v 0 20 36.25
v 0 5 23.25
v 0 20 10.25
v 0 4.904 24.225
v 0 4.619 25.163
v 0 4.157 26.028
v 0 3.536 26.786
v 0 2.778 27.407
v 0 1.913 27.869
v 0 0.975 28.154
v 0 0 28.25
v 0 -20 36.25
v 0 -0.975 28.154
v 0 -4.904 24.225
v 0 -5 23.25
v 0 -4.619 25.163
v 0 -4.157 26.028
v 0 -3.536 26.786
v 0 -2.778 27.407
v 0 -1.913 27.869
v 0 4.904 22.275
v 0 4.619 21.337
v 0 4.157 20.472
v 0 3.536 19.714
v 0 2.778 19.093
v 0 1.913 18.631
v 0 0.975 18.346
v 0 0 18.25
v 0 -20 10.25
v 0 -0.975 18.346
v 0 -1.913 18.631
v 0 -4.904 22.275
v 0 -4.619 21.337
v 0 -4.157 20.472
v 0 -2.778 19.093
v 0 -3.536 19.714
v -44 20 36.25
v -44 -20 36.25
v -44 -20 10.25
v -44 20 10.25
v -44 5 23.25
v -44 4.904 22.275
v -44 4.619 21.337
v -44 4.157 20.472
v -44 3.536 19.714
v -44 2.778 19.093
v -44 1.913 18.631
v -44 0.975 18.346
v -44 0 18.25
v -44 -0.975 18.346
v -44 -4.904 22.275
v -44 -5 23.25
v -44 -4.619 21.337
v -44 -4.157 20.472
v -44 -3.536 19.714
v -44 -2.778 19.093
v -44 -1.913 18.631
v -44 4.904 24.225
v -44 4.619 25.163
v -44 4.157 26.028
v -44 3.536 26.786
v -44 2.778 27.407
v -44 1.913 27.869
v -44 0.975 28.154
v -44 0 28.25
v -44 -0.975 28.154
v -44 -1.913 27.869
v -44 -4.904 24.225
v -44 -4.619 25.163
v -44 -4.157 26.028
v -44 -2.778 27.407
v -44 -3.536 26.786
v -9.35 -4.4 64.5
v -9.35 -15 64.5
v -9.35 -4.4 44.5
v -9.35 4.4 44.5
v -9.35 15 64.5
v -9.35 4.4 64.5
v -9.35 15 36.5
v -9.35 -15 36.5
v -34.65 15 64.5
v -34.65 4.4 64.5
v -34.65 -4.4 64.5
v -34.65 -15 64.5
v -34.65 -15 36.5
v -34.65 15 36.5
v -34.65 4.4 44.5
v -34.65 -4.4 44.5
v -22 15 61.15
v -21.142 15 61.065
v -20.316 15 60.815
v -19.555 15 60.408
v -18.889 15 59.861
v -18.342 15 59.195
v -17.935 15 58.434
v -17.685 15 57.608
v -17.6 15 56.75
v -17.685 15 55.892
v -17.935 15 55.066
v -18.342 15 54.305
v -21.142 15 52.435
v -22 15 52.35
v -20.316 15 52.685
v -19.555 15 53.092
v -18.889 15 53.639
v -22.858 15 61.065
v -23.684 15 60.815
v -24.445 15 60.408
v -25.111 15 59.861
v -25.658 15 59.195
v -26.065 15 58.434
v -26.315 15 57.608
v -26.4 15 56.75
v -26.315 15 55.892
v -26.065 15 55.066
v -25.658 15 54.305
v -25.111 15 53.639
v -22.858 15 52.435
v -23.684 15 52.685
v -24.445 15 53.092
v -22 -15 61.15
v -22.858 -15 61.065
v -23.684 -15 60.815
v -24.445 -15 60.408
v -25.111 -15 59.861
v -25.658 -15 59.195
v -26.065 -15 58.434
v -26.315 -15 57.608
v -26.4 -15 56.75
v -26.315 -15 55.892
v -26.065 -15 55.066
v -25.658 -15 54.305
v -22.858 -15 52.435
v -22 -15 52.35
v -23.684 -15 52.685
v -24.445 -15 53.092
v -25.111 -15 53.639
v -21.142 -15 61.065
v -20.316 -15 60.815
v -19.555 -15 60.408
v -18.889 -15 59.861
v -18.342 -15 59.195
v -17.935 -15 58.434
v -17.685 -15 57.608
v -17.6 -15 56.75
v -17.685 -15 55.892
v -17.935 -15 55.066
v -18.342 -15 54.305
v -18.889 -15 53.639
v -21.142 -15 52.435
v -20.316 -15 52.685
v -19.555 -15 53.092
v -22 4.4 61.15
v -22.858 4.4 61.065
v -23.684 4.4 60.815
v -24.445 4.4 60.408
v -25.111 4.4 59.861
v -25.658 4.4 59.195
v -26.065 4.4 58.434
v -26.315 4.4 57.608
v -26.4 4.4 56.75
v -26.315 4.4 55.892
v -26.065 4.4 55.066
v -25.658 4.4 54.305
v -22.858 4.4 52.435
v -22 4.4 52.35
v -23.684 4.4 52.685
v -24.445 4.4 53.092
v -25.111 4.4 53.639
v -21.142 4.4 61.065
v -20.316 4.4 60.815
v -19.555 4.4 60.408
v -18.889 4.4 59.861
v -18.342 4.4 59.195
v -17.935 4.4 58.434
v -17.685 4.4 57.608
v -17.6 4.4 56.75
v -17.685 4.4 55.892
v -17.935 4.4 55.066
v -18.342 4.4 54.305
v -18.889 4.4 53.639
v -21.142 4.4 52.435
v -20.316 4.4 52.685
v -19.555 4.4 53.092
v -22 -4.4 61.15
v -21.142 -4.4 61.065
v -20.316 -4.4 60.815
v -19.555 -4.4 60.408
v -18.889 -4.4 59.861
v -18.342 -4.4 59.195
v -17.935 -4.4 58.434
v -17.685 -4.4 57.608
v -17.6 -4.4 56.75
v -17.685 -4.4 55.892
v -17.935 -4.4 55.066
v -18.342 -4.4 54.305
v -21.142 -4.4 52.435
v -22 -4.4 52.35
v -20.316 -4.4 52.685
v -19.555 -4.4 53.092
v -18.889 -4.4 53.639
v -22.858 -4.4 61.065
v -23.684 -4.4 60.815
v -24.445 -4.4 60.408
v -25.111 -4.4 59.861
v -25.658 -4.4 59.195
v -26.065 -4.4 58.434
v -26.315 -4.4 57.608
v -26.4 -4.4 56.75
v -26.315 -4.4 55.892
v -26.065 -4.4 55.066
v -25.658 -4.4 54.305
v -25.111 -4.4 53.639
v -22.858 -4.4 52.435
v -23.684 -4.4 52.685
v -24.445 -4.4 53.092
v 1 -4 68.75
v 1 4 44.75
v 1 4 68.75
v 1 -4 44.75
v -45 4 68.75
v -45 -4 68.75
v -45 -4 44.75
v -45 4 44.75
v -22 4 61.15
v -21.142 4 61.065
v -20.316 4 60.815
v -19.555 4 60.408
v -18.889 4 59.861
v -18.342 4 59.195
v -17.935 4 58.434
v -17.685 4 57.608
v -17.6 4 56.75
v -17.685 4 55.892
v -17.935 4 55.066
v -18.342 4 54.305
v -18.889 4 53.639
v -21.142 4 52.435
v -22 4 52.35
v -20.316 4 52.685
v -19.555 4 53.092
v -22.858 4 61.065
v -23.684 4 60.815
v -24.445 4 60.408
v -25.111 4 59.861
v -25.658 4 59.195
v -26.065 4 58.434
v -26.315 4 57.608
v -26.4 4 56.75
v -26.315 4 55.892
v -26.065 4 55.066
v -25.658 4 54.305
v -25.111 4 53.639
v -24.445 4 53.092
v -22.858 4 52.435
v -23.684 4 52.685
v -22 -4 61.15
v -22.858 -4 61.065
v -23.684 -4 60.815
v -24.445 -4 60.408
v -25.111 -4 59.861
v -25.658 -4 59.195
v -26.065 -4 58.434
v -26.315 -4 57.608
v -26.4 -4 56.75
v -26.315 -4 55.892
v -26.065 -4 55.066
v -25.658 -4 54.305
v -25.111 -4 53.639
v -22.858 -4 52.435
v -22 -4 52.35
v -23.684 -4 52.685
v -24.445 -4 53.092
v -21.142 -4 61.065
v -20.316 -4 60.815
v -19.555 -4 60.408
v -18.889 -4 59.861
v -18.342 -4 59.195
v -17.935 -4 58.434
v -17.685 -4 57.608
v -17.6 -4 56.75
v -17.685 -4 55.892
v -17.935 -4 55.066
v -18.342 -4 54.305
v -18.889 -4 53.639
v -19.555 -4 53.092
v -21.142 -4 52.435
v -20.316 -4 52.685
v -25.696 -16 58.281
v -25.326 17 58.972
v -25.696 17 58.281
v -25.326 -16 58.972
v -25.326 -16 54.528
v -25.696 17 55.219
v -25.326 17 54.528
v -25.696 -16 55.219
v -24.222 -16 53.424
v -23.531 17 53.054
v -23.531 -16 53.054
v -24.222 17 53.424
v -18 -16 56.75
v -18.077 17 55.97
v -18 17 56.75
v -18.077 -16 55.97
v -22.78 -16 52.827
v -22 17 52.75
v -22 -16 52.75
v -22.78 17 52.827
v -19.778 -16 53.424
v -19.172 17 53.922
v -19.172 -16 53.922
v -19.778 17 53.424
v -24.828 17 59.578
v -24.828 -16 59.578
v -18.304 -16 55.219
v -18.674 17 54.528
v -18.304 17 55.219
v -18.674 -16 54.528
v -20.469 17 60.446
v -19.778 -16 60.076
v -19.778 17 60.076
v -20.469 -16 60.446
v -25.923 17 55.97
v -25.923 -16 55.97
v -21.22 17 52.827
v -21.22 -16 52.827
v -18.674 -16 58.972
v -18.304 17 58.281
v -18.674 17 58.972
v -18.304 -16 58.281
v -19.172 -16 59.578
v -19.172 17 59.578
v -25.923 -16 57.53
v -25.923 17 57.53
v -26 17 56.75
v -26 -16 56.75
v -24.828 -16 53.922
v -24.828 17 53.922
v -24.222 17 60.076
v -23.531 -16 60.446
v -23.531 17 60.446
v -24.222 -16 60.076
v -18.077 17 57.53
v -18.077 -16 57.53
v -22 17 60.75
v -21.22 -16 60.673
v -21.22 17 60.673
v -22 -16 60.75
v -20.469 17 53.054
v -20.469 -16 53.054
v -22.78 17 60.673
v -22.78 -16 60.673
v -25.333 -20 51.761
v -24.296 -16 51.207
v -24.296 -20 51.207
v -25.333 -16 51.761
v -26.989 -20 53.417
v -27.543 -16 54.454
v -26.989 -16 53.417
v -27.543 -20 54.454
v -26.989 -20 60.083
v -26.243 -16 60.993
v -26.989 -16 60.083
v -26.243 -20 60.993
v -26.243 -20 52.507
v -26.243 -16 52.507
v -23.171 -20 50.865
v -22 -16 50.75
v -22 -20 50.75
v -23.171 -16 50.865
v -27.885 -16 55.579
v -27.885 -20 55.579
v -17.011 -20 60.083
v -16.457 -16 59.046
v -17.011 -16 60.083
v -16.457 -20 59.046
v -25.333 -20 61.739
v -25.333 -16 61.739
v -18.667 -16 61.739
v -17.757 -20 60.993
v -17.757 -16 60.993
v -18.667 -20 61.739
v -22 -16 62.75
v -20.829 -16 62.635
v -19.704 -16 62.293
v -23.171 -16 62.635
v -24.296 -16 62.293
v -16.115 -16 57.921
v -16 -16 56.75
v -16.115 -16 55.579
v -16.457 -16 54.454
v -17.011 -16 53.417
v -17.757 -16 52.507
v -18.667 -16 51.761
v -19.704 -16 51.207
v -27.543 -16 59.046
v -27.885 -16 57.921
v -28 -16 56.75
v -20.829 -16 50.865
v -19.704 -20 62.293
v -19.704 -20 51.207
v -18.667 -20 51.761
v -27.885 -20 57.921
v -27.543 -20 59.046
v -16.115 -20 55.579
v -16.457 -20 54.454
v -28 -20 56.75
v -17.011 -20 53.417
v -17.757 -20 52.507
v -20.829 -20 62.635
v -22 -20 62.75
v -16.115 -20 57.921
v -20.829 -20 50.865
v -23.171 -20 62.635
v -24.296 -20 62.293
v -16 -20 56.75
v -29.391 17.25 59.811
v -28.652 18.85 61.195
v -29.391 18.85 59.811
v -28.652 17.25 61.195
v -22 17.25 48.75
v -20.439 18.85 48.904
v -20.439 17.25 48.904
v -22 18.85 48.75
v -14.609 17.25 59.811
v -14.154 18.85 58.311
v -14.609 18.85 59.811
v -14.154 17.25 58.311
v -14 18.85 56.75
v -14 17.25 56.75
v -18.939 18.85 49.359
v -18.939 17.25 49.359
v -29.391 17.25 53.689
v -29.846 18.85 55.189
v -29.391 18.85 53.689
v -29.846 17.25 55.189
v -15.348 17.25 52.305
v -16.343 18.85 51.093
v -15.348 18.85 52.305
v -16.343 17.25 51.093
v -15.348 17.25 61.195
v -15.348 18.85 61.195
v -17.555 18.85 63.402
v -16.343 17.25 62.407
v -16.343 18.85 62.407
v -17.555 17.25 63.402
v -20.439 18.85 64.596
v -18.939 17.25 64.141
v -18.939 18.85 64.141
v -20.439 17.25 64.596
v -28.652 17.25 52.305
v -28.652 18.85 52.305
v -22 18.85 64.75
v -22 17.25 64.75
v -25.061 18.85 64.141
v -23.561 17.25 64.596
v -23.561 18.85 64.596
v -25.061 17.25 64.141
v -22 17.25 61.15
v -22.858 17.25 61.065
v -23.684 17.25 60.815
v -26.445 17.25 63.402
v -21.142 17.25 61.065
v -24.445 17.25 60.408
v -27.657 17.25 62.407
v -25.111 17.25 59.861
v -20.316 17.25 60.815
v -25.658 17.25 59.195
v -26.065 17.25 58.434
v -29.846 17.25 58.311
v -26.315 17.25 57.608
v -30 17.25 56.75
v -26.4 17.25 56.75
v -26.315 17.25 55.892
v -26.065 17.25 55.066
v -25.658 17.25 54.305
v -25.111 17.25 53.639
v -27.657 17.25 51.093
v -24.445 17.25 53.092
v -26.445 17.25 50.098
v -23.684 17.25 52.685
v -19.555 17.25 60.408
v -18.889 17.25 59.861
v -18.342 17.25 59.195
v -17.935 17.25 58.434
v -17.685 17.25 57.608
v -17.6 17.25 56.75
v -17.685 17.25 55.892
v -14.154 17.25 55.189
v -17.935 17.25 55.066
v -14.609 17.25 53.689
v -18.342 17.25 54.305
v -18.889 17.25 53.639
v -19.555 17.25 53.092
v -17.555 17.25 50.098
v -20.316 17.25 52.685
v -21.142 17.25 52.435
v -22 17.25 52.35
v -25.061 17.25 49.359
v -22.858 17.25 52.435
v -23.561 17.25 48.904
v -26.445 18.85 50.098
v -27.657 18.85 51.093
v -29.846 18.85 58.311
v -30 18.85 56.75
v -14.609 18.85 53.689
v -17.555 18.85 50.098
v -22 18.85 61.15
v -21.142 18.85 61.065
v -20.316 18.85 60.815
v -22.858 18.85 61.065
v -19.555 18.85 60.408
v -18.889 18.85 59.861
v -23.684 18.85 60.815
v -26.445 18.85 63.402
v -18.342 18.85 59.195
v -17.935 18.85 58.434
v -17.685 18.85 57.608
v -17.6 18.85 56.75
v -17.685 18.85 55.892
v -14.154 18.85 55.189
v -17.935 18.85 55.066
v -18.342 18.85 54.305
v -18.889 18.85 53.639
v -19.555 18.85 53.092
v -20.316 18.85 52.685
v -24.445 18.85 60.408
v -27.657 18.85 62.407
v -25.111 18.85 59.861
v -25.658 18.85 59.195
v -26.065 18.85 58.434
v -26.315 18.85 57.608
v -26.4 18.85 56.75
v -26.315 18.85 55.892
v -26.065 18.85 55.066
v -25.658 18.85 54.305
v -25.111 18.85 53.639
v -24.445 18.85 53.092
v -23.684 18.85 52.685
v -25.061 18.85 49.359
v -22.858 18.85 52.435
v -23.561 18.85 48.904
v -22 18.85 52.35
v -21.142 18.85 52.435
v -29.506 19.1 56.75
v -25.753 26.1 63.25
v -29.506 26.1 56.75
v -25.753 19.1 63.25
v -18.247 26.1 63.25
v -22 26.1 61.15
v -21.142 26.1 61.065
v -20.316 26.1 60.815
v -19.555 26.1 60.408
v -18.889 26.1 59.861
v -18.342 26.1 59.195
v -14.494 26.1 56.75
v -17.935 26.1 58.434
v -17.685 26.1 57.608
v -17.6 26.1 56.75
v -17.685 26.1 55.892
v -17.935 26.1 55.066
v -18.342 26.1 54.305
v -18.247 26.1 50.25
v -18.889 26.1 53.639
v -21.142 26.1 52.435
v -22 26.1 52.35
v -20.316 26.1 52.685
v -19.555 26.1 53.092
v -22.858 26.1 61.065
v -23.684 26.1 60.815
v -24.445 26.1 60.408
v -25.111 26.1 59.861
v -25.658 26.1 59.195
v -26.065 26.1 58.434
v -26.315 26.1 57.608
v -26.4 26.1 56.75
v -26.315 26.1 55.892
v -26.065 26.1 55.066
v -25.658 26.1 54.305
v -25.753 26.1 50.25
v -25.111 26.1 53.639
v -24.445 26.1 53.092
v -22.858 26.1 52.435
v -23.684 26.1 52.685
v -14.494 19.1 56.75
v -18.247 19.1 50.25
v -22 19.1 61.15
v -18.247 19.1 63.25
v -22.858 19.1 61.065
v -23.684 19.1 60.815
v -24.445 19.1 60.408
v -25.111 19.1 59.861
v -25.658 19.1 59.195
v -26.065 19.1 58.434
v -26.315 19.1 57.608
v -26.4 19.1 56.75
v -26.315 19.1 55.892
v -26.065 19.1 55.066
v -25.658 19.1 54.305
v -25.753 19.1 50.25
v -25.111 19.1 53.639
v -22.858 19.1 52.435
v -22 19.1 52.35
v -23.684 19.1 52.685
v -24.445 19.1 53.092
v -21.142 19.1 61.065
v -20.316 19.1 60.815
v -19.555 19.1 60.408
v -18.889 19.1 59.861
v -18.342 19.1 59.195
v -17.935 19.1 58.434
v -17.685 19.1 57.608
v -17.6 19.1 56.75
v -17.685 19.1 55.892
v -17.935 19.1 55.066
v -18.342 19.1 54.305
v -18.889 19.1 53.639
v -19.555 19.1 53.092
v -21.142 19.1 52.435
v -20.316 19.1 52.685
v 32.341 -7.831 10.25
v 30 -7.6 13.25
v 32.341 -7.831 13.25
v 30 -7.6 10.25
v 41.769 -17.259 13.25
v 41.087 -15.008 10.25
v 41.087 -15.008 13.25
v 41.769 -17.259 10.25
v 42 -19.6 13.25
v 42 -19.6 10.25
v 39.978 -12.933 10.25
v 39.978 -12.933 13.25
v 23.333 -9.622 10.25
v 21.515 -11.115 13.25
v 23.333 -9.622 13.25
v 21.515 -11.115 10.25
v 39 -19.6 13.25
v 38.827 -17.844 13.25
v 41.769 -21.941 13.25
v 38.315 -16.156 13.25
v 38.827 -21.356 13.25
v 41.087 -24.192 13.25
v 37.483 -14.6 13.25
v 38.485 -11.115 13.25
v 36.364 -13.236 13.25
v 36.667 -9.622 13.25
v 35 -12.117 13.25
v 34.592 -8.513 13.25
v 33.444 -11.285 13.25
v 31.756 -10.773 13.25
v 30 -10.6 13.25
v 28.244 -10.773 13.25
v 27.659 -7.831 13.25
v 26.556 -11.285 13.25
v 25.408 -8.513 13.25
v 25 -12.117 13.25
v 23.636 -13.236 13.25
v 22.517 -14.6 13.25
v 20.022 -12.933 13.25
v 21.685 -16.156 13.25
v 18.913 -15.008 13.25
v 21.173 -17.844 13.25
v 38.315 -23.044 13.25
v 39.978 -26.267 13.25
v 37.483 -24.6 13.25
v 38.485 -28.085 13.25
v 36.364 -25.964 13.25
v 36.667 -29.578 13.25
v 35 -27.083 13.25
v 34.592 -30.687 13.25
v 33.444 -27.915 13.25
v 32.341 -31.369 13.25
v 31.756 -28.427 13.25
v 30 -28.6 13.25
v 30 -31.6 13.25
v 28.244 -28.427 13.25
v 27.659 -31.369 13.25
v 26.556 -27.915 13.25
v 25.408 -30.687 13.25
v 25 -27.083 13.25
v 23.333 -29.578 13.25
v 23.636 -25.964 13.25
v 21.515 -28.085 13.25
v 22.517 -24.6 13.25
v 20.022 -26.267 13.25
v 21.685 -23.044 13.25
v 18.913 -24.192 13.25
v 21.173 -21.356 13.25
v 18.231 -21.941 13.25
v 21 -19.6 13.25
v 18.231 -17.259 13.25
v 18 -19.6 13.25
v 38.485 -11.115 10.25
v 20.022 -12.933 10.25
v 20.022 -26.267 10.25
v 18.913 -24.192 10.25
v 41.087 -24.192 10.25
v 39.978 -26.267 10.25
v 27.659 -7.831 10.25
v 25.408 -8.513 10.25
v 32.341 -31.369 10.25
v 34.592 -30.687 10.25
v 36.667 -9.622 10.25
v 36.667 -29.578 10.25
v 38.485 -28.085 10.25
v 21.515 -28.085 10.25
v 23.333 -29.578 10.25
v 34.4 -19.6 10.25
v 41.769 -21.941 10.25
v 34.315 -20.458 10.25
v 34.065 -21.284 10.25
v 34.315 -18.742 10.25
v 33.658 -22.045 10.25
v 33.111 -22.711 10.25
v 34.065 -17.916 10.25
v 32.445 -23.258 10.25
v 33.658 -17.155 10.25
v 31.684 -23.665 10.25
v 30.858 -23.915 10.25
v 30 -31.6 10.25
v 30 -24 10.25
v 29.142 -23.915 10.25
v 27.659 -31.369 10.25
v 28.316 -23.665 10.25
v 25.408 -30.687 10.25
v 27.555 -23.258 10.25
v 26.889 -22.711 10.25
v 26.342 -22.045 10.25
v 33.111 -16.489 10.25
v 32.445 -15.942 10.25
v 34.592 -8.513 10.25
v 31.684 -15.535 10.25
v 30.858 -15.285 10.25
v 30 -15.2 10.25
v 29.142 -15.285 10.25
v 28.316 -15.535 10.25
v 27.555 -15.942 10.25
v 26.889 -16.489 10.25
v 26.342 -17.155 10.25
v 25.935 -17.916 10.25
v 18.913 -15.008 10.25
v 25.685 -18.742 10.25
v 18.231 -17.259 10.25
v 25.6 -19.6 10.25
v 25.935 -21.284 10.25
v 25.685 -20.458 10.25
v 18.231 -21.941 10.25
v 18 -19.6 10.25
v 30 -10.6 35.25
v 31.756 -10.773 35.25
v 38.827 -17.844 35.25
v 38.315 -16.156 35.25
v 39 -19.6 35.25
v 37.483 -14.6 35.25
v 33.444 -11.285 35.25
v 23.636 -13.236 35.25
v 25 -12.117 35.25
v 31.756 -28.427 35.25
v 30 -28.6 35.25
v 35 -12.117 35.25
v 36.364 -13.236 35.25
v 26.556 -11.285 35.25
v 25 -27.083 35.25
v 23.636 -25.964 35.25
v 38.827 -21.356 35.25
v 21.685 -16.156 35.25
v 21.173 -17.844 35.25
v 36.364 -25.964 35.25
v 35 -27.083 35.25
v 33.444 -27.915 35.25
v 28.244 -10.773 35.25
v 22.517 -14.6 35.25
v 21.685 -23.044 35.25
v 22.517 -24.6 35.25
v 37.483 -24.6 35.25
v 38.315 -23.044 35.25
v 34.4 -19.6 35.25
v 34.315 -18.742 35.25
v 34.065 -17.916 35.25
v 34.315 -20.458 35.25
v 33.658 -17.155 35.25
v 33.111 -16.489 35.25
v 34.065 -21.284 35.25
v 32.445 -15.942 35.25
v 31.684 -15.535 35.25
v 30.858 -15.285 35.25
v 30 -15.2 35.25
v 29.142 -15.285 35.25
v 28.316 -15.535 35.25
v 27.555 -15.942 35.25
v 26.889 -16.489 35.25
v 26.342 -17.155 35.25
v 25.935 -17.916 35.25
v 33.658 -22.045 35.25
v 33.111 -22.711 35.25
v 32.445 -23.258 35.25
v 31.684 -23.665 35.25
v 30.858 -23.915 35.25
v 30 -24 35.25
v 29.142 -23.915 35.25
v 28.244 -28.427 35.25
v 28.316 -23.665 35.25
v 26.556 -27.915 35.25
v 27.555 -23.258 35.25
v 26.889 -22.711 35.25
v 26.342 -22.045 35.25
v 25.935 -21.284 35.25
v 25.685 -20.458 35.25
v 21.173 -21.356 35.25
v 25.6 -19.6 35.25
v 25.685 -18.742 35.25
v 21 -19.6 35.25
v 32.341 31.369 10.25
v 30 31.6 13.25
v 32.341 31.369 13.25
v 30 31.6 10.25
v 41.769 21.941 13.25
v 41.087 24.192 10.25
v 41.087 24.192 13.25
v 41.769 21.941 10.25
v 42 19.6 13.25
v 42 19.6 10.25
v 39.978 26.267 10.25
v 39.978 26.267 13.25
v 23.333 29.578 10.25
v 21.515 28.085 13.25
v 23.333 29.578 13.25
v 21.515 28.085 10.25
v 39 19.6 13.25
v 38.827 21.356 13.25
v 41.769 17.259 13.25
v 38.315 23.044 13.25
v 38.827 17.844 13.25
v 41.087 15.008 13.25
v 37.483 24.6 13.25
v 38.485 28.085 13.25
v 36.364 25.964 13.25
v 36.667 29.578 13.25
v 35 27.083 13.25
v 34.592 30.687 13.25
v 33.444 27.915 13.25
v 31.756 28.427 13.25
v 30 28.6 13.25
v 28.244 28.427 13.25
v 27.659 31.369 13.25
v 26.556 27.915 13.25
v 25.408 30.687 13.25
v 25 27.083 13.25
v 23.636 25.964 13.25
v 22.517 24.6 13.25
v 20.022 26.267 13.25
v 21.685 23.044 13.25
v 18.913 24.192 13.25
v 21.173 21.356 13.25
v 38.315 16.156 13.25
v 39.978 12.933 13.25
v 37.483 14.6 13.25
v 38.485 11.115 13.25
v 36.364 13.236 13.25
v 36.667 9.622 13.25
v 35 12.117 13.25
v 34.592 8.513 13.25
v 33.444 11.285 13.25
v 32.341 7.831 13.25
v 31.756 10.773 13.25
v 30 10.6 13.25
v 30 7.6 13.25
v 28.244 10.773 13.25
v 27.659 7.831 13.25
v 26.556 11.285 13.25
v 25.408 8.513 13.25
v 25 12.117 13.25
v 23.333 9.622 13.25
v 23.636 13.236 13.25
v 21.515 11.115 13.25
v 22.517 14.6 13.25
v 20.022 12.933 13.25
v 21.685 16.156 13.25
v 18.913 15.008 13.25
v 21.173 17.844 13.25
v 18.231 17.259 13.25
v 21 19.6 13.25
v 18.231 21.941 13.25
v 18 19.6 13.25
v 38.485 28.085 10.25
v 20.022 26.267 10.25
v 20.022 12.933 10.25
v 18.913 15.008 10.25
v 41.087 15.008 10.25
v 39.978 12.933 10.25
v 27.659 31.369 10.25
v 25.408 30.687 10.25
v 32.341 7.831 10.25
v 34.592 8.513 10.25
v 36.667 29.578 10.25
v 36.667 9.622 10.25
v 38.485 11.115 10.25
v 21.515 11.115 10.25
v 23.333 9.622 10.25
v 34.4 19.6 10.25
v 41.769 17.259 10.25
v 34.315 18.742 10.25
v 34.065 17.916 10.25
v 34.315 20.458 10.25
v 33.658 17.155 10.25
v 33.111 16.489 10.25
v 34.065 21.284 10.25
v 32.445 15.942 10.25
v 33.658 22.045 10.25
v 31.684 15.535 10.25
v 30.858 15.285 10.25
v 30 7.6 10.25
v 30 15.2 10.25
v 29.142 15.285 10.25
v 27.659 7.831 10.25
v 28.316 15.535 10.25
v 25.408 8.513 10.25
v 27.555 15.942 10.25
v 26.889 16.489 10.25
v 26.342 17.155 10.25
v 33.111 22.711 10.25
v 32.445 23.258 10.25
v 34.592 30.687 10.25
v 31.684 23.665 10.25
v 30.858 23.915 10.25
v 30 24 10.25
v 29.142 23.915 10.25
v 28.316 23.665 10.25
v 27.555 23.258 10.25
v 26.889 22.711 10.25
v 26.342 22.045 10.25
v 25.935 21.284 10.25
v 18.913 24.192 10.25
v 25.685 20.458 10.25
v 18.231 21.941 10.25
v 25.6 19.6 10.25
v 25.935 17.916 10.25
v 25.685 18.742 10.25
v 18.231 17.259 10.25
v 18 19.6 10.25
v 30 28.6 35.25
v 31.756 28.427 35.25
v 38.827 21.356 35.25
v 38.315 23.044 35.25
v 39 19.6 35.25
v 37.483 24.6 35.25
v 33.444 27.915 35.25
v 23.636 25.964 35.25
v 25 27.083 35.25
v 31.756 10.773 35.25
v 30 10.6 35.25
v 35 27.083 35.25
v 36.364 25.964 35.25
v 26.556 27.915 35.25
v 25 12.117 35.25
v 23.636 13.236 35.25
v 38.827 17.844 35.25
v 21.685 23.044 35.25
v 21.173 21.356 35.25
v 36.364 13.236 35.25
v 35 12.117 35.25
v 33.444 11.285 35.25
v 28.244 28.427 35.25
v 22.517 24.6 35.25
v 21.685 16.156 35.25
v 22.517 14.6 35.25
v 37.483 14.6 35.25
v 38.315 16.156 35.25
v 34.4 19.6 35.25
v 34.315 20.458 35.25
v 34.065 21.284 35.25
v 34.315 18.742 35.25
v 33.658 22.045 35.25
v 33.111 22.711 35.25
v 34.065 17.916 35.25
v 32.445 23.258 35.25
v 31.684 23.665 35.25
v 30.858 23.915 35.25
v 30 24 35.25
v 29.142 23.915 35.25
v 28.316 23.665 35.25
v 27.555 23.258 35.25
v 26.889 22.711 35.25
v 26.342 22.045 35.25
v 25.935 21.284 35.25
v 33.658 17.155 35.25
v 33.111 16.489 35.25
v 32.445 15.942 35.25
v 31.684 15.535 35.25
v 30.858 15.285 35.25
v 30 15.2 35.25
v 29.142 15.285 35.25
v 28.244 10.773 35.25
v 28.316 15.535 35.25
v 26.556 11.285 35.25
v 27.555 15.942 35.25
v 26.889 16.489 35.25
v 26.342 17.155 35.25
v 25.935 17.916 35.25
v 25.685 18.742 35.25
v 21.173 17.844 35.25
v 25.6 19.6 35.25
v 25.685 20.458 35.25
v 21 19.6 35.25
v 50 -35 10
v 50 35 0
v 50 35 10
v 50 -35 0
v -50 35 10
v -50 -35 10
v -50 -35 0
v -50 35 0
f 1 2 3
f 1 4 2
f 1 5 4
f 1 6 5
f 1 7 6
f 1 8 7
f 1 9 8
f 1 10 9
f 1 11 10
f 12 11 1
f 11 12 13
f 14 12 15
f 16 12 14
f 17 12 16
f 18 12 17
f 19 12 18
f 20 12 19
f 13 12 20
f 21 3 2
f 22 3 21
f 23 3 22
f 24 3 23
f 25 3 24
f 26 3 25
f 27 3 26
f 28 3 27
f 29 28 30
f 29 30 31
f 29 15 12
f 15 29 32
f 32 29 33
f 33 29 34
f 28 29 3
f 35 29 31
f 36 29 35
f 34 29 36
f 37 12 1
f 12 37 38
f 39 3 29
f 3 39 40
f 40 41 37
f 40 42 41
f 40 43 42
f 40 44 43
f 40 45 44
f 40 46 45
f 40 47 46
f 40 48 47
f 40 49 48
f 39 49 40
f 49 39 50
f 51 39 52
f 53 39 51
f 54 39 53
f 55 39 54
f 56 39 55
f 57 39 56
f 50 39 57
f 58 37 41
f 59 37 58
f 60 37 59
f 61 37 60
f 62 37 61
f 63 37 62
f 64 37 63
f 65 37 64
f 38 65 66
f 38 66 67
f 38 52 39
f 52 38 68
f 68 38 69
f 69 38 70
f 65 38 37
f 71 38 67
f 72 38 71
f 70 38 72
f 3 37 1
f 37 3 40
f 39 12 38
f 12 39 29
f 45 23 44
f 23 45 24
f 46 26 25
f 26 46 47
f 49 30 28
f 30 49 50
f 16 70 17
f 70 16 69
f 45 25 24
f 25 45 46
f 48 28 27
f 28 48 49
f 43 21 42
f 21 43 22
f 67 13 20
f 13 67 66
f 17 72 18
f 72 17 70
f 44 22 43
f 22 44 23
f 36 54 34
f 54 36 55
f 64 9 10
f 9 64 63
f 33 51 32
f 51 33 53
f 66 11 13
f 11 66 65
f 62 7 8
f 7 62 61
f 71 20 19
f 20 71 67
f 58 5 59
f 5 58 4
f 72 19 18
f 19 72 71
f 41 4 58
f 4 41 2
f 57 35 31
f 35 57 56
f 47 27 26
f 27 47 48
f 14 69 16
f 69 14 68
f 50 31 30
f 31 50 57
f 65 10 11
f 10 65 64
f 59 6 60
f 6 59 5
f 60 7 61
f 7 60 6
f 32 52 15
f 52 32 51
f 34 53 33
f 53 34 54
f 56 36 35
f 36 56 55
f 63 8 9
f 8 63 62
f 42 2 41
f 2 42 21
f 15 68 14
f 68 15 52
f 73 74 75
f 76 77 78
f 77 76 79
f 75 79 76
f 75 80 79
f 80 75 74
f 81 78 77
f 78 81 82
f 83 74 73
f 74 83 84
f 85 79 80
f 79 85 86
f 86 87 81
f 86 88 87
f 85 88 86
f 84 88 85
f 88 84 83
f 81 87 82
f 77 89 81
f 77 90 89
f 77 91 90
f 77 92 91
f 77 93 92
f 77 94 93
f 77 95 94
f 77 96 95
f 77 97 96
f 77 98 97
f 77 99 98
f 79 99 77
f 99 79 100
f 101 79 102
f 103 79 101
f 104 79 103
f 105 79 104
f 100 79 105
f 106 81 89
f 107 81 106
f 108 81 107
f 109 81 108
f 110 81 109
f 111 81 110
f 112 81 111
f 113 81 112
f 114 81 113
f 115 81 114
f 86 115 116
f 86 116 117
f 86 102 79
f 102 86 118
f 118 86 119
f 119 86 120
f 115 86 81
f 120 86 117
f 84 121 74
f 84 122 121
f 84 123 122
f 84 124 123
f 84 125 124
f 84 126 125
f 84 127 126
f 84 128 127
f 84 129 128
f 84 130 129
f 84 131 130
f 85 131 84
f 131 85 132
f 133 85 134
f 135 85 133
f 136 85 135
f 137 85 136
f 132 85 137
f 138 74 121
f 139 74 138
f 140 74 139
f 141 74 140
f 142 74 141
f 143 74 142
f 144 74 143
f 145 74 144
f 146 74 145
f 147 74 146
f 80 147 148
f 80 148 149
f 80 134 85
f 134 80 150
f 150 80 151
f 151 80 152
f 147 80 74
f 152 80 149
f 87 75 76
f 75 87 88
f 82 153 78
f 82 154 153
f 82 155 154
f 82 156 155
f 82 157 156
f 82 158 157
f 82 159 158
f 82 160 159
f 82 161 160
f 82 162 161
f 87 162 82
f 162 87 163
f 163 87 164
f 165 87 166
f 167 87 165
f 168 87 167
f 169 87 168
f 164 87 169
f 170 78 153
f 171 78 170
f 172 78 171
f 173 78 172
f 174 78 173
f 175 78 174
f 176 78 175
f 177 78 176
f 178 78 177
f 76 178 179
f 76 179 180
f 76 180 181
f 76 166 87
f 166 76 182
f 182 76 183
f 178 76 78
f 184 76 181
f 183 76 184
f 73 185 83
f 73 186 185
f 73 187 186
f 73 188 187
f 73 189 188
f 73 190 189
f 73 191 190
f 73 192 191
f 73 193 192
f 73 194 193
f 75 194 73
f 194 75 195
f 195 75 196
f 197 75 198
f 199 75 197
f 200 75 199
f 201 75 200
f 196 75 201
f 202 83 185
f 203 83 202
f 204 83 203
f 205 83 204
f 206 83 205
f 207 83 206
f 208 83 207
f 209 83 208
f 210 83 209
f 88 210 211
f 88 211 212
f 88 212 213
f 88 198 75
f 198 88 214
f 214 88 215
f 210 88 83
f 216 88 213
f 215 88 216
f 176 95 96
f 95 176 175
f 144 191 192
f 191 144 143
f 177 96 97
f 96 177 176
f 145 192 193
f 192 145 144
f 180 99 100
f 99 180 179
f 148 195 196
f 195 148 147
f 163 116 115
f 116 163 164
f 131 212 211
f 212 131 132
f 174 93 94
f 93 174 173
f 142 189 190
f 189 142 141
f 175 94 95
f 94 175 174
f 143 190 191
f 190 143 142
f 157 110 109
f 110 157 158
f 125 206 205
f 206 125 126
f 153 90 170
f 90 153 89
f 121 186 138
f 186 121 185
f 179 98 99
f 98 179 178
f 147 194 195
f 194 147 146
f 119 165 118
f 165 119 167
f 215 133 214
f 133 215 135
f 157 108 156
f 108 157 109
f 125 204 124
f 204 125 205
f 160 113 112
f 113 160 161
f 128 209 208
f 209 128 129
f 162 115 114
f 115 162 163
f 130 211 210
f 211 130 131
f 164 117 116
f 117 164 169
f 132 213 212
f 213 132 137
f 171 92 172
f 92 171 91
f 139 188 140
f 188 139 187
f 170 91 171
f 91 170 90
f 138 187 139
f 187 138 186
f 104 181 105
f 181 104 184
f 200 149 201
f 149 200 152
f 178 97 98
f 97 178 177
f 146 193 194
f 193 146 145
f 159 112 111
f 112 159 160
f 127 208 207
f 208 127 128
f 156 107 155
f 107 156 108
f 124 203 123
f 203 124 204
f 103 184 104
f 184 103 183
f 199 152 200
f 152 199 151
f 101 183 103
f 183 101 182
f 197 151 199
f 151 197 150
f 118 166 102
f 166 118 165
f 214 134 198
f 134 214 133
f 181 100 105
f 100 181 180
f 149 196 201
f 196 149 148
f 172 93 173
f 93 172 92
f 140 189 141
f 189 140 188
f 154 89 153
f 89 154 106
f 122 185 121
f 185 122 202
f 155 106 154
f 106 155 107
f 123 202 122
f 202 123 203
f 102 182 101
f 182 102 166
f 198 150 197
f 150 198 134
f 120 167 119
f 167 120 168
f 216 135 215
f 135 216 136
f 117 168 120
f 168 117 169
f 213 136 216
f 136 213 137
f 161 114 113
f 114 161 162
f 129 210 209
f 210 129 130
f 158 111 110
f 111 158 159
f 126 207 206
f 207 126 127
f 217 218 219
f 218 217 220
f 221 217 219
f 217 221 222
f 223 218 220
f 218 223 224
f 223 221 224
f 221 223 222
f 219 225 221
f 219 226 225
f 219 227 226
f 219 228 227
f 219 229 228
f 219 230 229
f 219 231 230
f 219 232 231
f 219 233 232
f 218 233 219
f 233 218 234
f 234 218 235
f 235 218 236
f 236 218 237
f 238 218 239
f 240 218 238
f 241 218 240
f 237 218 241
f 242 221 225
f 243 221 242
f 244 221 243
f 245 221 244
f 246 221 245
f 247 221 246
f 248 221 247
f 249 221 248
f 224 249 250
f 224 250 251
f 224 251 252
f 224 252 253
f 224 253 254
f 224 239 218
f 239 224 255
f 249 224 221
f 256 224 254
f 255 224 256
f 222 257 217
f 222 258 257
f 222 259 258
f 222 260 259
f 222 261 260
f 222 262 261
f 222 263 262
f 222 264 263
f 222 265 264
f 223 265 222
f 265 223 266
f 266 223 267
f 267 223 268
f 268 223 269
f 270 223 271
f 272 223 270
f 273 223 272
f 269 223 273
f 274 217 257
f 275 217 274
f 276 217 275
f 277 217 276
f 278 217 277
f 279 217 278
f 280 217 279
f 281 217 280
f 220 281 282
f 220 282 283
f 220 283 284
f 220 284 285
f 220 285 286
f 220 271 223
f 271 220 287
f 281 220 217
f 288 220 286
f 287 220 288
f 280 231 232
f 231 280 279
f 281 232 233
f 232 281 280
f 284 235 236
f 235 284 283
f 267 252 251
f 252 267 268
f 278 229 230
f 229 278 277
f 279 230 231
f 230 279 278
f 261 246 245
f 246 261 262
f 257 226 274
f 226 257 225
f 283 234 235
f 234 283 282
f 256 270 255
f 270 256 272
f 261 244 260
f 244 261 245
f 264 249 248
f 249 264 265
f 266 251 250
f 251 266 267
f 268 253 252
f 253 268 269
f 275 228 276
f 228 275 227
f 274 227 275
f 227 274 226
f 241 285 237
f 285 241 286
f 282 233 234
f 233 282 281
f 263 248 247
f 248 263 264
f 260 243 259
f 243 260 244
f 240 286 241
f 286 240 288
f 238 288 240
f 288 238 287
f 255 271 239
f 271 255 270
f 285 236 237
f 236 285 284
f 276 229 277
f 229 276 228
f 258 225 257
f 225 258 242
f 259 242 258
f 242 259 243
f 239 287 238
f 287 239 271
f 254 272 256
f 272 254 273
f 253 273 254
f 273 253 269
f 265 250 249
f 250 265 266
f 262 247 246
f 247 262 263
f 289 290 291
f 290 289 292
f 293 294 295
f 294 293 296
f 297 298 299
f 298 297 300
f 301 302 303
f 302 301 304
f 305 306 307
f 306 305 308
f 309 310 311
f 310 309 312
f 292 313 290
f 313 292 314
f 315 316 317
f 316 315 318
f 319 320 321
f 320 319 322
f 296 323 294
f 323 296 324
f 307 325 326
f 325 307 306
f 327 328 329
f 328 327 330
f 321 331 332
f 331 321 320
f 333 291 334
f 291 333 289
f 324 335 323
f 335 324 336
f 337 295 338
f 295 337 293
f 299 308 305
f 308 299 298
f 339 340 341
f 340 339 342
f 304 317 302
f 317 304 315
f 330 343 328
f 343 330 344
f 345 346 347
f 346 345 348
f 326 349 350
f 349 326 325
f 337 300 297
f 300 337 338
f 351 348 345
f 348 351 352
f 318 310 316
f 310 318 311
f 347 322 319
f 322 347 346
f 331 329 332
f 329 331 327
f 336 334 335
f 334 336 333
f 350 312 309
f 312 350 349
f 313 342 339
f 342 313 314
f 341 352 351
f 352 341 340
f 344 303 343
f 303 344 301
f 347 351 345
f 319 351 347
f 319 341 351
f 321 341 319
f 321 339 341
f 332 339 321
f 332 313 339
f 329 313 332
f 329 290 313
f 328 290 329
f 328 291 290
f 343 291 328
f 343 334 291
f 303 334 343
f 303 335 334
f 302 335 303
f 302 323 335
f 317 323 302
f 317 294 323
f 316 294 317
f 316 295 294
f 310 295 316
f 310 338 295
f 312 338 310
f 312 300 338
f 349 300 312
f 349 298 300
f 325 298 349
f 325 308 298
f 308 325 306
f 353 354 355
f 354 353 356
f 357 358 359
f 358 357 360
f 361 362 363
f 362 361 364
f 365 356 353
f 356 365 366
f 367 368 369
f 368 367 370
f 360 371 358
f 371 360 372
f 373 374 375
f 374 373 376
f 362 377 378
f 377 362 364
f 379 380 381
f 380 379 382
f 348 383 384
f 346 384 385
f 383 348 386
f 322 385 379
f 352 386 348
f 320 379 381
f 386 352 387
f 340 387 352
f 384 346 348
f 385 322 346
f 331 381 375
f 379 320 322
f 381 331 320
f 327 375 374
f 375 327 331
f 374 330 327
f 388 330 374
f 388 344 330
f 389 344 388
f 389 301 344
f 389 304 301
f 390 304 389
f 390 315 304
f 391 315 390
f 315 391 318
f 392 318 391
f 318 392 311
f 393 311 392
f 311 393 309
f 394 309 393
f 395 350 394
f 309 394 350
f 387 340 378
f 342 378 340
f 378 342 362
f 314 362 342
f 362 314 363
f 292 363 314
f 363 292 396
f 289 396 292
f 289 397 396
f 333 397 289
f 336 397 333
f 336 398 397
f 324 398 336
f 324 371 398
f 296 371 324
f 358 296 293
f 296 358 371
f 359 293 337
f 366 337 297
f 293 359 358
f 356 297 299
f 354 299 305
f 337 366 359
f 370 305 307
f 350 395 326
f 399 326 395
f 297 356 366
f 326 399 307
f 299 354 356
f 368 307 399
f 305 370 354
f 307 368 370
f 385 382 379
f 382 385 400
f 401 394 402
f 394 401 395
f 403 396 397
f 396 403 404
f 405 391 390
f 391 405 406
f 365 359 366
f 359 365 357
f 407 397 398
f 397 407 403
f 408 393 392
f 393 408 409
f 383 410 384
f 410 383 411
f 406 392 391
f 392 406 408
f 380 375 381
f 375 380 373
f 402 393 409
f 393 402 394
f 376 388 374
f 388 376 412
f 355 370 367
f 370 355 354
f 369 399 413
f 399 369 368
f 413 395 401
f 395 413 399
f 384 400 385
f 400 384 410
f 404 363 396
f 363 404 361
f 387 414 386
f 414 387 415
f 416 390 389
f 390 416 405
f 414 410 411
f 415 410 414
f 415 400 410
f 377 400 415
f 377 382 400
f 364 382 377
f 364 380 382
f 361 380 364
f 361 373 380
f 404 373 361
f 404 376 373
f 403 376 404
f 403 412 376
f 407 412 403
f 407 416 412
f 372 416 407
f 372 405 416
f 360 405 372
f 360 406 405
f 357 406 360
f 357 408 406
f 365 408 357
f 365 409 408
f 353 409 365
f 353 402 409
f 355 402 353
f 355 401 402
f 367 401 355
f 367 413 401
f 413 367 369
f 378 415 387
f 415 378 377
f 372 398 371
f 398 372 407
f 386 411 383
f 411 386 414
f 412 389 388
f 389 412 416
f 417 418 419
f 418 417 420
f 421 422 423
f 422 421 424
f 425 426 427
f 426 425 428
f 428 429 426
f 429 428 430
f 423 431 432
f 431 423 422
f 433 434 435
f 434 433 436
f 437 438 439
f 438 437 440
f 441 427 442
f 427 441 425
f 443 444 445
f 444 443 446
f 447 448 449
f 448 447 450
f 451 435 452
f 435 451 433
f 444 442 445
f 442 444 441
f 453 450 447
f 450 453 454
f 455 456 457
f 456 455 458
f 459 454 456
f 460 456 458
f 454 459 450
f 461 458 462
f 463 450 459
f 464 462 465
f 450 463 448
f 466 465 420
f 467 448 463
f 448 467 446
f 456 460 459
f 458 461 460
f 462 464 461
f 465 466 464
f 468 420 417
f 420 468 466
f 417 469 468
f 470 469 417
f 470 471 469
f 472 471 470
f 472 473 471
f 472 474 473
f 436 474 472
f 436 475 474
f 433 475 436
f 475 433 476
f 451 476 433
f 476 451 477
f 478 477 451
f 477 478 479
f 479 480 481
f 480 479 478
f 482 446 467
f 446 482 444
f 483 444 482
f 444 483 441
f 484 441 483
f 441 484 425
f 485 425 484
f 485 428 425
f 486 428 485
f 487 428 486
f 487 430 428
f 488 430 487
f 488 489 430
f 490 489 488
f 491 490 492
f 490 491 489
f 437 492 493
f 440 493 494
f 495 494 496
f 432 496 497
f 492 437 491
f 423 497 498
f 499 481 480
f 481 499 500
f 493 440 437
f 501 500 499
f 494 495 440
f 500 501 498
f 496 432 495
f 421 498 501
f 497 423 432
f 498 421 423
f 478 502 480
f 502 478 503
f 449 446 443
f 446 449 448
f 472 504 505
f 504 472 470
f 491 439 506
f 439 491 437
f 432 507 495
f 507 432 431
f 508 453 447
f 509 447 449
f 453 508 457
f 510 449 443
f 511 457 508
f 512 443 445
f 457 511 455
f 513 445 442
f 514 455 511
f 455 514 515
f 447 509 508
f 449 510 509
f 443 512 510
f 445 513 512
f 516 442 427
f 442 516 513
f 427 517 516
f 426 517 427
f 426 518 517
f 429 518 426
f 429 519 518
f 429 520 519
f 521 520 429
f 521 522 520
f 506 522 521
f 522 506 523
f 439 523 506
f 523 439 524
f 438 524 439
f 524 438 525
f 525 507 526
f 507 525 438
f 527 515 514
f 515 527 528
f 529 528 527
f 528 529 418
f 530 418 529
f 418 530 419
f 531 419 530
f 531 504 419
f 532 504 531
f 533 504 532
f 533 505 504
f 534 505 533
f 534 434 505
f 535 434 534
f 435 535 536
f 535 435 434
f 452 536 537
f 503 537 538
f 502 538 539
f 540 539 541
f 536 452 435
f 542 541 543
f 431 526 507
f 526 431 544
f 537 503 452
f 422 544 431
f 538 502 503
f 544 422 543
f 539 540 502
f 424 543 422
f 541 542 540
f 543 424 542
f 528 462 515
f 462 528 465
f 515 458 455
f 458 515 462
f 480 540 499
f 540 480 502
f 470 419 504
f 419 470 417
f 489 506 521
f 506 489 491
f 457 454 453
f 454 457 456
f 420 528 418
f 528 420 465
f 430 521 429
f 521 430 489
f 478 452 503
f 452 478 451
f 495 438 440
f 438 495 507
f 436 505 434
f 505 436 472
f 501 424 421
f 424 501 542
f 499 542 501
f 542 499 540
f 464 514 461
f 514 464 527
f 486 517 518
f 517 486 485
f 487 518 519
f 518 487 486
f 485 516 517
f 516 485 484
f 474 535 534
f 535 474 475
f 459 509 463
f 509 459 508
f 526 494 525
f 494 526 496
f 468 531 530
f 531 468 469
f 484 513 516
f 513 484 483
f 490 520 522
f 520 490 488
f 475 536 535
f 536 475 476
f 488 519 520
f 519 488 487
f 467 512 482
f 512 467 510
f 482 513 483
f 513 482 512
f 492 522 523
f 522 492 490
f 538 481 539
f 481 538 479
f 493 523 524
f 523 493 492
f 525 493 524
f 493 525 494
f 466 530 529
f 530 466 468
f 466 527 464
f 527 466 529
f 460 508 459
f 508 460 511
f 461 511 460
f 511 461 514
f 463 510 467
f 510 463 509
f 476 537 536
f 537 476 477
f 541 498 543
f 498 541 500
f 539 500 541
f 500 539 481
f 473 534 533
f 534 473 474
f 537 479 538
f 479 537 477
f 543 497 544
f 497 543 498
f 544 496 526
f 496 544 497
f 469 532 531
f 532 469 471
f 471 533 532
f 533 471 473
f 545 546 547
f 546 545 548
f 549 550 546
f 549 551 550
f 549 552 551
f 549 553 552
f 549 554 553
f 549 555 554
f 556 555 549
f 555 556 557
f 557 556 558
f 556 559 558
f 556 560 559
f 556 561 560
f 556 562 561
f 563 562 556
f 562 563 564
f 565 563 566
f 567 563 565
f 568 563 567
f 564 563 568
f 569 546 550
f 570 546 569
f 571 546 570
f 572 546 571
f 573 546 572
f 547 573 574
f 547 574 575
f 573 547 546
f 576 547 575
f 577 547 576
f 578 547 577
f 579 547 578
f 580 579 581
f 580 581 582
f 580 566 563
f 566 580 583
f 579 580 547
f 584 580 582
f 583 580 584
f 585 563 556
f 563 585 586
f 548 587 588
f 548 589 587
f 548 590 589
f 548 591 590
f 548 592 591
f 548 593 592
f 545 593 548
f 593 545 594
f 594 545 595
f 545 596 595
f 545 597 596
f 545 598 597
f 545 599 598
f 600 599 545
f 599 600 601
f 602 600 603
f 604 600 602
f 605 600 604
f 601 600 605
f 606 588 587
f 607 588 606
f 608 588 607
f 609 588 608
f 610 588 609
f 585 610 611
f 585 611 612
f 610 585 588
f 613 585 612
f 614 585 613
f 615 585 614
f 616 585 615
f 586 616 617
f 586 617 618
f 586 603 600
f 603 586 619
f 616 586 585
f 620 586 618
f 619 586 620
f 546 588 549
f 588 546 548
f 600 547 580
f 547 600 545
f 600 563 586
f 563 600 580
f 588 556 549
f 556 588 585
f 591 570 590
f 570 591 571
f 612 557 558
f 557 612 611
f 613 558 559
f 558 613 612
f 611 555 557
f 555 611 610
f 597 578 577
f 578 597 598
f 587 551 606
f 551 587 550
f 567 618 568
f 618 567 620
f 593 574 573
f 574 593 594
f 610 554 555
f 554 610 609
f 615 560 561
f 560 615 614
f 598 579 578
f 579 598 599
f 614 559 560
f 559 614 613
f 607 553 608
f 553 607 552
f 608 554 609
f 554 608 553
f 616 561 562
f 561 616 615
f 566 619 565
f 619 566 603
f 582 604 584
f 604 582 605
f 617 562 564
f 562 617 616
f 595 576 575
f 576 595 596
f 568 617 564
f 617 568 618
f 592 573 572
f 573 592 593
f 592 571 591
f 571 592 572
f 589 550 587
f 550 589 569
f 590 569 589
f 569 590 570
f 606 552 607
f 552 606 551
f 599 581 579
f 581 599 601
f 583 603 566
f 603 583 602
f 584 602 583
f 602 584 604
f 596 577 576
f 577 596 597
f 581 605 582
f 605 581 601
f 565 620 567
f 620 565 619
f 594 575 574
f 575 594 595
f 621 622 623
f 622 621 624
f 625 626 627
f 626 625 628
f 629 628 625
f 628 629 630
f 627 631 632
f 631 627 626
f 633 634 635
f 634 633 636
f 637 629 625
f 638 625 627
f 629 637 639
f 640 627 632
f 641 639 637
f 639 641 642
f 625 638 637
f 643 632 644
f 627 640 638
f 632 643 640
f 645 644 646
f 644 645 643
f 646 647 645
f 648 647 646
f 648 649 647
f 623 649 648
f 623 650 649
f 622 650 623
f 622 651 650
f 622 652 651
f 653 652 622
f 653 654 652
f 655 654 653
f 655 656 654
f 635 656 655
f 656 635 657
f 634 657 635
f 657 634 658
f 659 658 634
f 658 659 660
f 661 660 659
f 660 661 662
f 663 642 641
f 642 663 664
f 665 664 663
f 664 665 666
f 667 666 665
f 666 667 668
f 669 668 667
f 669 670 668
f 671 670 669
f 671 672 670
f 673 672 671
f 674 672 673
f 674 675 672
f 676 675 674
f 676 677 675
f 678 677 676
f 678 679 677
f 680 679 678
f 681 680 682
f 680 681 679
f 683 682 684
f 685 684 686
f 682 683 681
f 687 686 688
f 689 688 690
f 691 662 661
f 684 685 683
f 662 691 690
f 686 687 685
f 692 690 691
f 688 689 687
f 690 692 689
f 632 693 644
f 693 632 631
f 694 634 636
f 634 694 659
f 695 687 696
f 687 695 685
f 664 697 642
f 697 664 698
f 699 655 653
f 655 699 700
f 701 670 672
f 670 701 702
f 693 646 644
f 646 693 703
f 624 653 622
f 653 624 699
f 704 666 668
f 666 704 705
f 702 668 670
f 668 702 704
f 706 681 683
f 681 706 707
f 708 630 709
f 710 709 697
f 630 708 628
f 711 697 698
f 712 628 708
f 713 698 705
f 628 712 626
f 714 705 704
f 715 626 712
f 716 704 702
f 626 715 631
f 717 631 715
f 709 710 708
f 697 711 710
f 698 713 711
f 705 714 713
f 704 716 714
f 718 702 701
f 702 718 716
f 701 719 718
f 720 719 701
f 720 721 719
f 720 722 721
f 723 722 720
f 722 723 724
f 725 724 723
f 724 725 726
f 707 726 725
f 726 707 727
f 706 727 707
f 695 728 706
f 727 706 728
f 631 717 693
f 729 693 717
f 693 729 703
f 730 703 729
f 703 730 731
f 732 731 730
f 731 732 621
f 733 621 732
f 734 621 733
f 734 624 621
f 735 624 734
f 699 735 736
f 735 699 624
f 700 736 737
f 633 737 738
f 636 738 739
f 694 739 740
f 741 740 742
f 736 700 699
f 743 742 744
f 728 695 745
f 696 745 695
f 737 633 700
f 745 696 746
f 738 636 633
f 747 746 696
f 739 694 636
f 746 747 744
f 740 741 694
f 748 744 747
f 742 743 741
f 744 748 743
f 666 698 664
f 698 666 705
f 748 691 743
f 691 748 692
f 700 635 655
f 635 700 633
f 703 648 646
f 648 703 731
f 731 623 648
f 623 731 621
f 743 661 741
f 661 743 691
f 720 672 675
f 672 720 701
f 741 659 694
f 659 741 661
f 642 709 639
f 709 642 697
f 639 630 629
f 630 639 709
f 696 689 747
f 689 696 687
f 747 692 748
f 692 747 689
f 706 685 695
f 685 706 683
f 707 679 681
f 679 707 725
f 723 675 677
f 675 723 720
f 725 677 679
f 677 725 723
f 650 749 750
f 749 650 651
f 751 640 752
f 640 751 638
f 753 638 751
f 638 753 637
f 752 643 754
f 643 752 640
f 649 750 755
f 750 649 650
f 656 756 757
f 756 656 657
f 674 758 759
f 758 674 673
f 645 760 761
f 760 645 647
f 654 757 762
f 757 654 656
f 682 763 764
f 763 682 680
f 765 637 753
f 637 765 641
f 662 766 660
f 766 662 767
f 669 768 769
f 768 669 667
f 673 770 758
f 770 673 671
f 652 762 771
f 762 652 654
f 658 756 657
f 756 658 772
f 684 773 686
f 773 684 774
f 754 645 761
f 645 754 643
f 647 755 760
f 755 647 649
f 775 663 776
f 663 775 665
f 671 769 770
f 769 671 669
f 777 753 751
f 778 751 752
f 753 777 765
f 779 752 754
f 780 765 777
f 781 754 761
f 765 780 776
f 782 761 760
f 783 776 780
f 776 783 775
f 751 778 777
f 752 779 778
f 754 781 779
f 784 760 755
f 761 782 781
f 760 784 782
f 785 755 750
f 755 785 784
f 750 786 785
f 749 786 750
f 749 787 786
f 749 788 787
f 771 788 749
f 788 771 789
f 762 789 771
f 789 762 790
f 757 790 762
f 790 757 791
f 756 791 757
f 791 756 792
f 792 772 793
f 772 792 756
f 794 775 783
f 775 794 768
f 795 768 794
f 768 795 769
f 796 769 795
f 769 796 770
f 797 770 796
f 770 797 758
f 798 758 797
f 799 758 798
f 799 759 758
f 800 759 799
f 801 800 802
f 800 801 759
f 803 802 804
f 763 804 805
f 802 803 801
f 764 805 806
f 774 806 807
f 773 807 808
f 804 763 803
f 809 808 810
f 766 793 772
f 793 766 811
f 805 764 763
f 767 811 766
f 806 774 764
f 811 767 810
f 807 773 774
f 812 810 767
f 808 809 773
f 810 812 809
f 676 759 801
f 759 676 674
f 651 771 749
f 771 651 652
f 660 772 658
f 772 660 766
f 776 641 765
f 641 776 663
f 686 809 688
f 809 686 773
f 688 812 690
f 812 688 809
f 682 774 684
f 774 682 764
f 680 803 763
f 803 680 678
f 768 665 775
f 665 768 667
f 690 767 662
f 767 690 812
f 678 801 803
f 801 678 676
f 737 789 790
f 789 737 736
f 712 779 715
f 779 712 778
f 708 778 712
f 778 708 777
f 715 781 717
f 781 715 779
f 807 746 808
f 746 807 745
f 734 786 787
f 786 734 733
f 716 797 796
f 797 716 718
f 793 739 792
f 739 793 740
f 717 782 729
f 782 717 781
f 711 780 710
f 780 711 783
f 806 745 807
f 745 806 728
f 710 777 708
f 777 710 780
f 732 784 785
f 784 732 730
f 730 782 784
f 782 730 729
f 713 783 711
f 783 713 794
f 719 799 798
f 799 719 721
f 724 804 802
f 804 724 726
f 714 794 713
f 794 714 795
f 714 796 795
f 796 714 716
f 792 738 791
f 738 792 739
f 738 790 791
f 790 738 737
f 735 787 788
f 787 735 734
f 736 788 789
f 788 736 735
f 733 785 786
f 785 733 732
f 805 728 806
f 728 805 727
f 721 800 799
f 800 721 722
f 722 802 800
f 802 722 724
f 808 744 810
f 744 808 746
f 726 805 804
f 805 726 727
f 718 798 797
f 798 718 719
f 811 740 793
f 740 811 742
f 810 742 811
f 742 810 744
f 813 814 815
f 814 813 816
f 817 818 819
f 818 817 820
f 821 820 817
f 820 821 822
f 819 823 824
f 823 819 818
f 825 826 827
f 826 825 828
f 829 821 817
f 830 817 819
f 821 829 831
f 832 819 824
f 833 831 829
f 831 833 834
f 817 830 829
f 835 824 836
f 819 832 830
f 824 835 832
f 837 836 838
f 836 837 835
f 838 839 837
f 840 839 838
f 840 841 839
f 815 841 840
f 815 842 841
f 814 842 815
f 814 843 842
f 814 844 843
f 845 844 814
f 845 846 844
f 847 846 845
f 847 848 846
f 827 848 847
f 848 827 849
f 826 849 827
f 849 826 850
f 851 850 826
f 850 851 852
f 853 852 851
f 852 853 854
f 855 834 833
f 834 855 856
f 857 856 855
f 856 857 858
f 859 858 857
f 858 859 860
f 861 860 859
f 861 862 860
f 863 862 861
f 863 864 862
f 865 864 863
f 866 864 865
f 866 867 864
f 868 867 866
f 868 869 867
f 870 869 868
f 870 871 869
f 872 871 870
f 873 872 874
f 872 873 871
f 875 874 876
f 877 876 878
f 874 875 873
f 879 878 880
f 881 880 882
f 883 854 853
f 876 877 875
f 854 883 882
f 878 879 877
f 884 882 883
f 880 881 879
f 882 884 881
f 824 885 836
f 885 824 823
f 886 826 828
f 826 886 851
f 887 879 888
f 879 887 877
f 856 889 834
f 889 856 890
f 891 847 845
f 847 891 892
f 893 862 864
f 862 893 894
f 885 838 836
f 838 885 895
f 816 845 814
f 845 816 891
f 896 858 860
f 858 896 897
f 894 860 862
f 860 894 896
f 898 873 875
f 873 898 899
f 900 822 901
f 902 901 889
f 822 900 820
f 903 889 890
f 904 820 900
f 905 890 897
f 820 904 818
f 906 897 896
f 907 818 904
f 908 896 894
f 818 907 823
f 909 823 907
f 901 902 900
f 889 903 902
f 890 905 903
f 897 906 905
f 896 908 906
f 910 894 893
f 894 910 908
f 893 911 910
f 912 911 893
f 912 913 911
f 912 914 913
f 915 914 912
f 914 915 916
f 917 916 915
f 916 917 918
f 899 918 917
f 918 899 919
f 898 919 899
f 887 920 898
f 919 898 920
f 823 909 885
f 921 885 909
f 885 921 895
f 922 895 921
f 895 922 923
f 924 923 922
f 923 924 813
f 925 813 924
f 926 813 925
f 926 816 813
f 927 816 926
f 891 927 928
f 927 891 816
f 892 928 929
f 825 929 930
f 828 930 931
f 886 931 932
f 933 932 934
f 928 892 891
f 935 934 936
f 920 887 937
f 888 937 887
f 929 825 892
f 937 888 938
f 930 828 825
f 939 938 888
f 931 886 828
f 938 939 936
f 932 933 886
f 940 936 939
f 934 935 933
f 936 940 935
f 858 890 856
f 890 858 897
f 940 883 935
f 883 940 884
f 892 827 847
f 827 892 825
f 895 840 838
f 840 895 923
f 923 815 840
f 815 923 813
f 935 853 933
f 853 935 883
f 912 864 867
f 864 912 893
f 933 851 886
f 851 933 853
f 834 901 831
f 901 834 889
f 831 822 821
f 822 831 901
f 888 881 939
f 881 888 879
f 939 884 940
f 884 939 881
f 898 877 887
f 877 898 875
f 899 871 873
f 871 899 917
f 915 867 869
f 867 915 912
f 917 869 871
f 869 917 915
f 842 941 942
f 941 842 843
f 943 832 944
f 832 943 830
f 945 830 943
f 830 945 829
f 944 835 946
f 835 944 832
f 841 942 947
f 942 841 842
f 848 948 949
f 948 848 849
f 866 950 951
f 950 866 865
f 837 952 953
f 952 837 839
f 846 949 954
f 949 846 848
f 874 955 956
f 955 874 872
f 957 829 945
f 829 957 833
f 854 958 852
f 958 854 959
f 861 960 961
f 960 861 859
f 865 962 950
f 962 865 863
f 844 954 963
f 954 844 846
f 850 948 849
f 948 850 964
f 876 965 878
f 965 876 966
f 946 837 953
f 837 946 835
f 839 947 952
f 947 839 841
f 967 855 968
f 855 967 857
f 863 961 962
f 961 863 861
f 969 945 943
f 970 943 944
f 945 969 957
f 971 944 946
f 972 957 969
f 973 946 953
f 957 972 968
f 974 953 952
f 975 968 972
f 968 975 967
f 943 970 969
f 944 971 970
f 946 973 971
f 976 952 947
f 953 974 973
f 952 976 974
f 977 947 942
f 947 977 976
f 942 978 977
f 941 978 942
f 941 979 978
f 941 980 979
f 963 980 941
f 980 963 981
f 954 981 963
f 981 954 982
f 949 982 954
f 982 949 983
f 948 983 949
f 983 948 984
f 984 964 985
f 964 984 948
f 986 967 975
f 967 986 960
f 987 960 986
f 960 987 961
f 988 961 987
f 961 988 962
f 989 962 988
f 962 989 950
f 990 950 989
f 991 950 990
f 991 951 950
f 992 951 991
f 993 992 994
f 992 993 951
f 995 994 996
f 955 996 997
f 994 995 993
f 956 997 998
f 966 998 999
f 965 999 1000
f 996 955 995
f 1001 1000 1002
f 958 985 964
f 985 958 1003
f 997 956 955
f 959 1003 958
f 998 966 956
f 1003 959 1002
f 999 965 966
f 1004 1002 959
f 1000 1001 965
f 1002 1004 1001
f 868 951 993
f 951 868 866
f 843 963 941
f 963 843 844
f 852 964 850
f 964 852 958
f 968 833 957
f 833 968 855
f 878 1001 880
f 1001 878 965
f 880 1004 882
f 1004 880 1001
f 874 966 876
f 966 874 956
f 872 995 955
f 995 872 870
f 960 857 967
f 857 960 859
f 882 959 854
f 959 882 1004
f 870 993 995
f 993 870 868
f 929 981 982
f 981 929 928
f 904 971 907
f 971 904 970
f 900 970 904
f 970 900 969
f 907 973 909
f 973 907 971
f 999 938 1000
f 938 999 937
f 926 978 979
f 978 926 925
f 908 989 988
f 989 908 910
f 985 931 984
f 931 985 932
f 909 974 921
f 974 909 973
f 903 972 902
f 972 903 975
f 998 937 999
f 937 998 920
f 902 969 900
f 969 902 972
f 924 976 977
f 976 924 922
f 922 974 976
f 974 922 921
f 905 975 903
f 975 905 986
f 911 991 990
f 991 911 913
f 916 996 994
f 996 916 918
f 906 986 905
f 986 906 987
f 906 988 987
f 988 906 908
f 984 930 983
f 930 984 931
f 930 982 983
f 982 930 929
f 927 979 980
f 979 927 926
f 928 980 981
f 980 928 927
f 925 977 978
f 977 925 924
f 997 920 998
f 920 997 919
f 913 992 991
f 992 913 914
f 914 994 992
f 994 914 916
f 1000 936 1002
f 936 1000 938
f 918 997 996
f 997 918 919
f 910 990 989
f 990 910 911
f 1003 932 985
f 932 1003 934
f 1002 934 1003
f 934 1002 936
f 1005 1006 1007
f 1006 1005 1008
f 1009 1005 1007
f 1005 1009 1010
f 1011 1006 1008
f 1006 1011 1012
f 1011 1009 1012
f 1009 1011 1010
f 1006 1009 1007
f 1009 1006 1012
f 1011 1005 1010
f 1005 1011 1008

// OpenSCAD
$fn = 32;

// ------------------------------------------------------------------------
// Indexing jig: plate 100 x 70 mm, pin d8
// Every part is its own module, assembly() places every instance.
// ------------------------------------------------------------------------

// --- part 1 ---
module jig_plate() {
  difference() {
    translate([-50, -35, 0]) cube([100, 70, 10]);
  }
}

// --- part 2 ---
module locator_block() {
  difference() {
    translate([-22, -20, 0]) cube([44, 40, 26]);
    translate([0, 0, 13]) rotate([0, 90, 0]) cylinder(h = 46, d = 10, center = true);
  }
}

// --- part 3 ---
module index_fork() {
  difference() {
    translate([-12.65, -15, 0]) cube([25.3, 30, 28]);
    translate([-13.65, -4.4, 8]) cube([27.3, 8.8, 21]);
    translate([0, 0, 20.25]) rotate([90, 0, 0]) cylinder(h = 32, d = 8.8, center = true);
  }
}

// --- part 4 ---
module index_arm() {
  difference() {
    translate([-23, -4, 0]) cube([46, 8, 24]);
    translate([0, 0, 12]) rotate([90, 0, 0]) cylinder(h = 10, d = 8.8, center = true);
  }
}

// --- part 5 ---
module index_pin() {
  rotate([0, 90, 0]) cylinder(h = 34, d = 8, center = true);
  translate([-20, 0, 0]) rotate([0, 90, 0]) cylinder(h = 4, d = 12);
}

// --- part 6 ---
module pin_washer() {
  difference() {
      translate([0, 0, 0]) cylinder(h = 1.6, d = 16);
      translate([0, 0, -1]) cylinder(h = 3.6, d = 8.8);
    }
}

// --- part 7 ---
module lock_nut() {
  difference() {
    linear_extrude(height = 7) polygon(points = [[7.506, 0], [3.753, 6.5], [-3.753, 6.5], [-7.506, 0], [-3.753, -6.5], [3.753, -6.5]]);
    translate([0, 0, -1]) cylinder(h = 9, d = 8.8);
  }
}

// --- part 8 ---
module guide_bush_a() {
  difference() {
    union() {
      cylinder(h = 3, d = 24);
      translate([0, 0, 3]) cylinder(h = 22, d = 18);
    }
    translate([0, 0, -1]) cylinder(h = 27, d = 8.8);
  }
}

// --- part 9 ---
module guide_bush_b() {
  difference() {
    union() {
      cylinder(h = 3, d = 24);
      translate([0, 0, 3]) cylinder(h = 22, d = 18);
    }
    translate([0, 0, -1]) cylinder(h = 27, d = 8.8);
  }
}

// --- assembly ---
module assembly() {
  color([0.80, 0.24, 0.20]) translate([0, 0, 0]) rotate([0, 0, 0]) jig_plate();
  color([0.20, 0.45, 0.75]) translate([-22, 0, 10.25]) rotate([0, 0, 0]) locator_block();
  color([0.25, 0.62, 0.32]) translate([-22, 0, 36.5]) rotate([0, 0, 0]) index_fork();
  color([0.92, 0.70, 0.18]) translate([-22, 0, 44.75]) rotate([0, 0, 0]) index_arm();
  color([0.58, 0.35, 0.70]) translate([-22, 0, 56.75]) rotate([0, 0, 90]) index_pin();
  color([0.16, 0.66, 0.66]) translate([-22, 18.85, 56.75]) rotate([90, 0, 0]) pin_washer();
  color([0.85, 0.48, 0.18]) translate([-22, 26.1, 56.75]) rotate([90, 0, 0]) lock_nut();
  color([0.55, 0.60, 0.65]) translate([30, -19.6, 10.25]) rotate([0, 0, 0]) guide_bush_a();
  color([0.75, 0.30, 0.55]) translate([30, 19.6, 10.25]) rotate([0, 0, 0]) guide_bush_b();
}

assembly();
